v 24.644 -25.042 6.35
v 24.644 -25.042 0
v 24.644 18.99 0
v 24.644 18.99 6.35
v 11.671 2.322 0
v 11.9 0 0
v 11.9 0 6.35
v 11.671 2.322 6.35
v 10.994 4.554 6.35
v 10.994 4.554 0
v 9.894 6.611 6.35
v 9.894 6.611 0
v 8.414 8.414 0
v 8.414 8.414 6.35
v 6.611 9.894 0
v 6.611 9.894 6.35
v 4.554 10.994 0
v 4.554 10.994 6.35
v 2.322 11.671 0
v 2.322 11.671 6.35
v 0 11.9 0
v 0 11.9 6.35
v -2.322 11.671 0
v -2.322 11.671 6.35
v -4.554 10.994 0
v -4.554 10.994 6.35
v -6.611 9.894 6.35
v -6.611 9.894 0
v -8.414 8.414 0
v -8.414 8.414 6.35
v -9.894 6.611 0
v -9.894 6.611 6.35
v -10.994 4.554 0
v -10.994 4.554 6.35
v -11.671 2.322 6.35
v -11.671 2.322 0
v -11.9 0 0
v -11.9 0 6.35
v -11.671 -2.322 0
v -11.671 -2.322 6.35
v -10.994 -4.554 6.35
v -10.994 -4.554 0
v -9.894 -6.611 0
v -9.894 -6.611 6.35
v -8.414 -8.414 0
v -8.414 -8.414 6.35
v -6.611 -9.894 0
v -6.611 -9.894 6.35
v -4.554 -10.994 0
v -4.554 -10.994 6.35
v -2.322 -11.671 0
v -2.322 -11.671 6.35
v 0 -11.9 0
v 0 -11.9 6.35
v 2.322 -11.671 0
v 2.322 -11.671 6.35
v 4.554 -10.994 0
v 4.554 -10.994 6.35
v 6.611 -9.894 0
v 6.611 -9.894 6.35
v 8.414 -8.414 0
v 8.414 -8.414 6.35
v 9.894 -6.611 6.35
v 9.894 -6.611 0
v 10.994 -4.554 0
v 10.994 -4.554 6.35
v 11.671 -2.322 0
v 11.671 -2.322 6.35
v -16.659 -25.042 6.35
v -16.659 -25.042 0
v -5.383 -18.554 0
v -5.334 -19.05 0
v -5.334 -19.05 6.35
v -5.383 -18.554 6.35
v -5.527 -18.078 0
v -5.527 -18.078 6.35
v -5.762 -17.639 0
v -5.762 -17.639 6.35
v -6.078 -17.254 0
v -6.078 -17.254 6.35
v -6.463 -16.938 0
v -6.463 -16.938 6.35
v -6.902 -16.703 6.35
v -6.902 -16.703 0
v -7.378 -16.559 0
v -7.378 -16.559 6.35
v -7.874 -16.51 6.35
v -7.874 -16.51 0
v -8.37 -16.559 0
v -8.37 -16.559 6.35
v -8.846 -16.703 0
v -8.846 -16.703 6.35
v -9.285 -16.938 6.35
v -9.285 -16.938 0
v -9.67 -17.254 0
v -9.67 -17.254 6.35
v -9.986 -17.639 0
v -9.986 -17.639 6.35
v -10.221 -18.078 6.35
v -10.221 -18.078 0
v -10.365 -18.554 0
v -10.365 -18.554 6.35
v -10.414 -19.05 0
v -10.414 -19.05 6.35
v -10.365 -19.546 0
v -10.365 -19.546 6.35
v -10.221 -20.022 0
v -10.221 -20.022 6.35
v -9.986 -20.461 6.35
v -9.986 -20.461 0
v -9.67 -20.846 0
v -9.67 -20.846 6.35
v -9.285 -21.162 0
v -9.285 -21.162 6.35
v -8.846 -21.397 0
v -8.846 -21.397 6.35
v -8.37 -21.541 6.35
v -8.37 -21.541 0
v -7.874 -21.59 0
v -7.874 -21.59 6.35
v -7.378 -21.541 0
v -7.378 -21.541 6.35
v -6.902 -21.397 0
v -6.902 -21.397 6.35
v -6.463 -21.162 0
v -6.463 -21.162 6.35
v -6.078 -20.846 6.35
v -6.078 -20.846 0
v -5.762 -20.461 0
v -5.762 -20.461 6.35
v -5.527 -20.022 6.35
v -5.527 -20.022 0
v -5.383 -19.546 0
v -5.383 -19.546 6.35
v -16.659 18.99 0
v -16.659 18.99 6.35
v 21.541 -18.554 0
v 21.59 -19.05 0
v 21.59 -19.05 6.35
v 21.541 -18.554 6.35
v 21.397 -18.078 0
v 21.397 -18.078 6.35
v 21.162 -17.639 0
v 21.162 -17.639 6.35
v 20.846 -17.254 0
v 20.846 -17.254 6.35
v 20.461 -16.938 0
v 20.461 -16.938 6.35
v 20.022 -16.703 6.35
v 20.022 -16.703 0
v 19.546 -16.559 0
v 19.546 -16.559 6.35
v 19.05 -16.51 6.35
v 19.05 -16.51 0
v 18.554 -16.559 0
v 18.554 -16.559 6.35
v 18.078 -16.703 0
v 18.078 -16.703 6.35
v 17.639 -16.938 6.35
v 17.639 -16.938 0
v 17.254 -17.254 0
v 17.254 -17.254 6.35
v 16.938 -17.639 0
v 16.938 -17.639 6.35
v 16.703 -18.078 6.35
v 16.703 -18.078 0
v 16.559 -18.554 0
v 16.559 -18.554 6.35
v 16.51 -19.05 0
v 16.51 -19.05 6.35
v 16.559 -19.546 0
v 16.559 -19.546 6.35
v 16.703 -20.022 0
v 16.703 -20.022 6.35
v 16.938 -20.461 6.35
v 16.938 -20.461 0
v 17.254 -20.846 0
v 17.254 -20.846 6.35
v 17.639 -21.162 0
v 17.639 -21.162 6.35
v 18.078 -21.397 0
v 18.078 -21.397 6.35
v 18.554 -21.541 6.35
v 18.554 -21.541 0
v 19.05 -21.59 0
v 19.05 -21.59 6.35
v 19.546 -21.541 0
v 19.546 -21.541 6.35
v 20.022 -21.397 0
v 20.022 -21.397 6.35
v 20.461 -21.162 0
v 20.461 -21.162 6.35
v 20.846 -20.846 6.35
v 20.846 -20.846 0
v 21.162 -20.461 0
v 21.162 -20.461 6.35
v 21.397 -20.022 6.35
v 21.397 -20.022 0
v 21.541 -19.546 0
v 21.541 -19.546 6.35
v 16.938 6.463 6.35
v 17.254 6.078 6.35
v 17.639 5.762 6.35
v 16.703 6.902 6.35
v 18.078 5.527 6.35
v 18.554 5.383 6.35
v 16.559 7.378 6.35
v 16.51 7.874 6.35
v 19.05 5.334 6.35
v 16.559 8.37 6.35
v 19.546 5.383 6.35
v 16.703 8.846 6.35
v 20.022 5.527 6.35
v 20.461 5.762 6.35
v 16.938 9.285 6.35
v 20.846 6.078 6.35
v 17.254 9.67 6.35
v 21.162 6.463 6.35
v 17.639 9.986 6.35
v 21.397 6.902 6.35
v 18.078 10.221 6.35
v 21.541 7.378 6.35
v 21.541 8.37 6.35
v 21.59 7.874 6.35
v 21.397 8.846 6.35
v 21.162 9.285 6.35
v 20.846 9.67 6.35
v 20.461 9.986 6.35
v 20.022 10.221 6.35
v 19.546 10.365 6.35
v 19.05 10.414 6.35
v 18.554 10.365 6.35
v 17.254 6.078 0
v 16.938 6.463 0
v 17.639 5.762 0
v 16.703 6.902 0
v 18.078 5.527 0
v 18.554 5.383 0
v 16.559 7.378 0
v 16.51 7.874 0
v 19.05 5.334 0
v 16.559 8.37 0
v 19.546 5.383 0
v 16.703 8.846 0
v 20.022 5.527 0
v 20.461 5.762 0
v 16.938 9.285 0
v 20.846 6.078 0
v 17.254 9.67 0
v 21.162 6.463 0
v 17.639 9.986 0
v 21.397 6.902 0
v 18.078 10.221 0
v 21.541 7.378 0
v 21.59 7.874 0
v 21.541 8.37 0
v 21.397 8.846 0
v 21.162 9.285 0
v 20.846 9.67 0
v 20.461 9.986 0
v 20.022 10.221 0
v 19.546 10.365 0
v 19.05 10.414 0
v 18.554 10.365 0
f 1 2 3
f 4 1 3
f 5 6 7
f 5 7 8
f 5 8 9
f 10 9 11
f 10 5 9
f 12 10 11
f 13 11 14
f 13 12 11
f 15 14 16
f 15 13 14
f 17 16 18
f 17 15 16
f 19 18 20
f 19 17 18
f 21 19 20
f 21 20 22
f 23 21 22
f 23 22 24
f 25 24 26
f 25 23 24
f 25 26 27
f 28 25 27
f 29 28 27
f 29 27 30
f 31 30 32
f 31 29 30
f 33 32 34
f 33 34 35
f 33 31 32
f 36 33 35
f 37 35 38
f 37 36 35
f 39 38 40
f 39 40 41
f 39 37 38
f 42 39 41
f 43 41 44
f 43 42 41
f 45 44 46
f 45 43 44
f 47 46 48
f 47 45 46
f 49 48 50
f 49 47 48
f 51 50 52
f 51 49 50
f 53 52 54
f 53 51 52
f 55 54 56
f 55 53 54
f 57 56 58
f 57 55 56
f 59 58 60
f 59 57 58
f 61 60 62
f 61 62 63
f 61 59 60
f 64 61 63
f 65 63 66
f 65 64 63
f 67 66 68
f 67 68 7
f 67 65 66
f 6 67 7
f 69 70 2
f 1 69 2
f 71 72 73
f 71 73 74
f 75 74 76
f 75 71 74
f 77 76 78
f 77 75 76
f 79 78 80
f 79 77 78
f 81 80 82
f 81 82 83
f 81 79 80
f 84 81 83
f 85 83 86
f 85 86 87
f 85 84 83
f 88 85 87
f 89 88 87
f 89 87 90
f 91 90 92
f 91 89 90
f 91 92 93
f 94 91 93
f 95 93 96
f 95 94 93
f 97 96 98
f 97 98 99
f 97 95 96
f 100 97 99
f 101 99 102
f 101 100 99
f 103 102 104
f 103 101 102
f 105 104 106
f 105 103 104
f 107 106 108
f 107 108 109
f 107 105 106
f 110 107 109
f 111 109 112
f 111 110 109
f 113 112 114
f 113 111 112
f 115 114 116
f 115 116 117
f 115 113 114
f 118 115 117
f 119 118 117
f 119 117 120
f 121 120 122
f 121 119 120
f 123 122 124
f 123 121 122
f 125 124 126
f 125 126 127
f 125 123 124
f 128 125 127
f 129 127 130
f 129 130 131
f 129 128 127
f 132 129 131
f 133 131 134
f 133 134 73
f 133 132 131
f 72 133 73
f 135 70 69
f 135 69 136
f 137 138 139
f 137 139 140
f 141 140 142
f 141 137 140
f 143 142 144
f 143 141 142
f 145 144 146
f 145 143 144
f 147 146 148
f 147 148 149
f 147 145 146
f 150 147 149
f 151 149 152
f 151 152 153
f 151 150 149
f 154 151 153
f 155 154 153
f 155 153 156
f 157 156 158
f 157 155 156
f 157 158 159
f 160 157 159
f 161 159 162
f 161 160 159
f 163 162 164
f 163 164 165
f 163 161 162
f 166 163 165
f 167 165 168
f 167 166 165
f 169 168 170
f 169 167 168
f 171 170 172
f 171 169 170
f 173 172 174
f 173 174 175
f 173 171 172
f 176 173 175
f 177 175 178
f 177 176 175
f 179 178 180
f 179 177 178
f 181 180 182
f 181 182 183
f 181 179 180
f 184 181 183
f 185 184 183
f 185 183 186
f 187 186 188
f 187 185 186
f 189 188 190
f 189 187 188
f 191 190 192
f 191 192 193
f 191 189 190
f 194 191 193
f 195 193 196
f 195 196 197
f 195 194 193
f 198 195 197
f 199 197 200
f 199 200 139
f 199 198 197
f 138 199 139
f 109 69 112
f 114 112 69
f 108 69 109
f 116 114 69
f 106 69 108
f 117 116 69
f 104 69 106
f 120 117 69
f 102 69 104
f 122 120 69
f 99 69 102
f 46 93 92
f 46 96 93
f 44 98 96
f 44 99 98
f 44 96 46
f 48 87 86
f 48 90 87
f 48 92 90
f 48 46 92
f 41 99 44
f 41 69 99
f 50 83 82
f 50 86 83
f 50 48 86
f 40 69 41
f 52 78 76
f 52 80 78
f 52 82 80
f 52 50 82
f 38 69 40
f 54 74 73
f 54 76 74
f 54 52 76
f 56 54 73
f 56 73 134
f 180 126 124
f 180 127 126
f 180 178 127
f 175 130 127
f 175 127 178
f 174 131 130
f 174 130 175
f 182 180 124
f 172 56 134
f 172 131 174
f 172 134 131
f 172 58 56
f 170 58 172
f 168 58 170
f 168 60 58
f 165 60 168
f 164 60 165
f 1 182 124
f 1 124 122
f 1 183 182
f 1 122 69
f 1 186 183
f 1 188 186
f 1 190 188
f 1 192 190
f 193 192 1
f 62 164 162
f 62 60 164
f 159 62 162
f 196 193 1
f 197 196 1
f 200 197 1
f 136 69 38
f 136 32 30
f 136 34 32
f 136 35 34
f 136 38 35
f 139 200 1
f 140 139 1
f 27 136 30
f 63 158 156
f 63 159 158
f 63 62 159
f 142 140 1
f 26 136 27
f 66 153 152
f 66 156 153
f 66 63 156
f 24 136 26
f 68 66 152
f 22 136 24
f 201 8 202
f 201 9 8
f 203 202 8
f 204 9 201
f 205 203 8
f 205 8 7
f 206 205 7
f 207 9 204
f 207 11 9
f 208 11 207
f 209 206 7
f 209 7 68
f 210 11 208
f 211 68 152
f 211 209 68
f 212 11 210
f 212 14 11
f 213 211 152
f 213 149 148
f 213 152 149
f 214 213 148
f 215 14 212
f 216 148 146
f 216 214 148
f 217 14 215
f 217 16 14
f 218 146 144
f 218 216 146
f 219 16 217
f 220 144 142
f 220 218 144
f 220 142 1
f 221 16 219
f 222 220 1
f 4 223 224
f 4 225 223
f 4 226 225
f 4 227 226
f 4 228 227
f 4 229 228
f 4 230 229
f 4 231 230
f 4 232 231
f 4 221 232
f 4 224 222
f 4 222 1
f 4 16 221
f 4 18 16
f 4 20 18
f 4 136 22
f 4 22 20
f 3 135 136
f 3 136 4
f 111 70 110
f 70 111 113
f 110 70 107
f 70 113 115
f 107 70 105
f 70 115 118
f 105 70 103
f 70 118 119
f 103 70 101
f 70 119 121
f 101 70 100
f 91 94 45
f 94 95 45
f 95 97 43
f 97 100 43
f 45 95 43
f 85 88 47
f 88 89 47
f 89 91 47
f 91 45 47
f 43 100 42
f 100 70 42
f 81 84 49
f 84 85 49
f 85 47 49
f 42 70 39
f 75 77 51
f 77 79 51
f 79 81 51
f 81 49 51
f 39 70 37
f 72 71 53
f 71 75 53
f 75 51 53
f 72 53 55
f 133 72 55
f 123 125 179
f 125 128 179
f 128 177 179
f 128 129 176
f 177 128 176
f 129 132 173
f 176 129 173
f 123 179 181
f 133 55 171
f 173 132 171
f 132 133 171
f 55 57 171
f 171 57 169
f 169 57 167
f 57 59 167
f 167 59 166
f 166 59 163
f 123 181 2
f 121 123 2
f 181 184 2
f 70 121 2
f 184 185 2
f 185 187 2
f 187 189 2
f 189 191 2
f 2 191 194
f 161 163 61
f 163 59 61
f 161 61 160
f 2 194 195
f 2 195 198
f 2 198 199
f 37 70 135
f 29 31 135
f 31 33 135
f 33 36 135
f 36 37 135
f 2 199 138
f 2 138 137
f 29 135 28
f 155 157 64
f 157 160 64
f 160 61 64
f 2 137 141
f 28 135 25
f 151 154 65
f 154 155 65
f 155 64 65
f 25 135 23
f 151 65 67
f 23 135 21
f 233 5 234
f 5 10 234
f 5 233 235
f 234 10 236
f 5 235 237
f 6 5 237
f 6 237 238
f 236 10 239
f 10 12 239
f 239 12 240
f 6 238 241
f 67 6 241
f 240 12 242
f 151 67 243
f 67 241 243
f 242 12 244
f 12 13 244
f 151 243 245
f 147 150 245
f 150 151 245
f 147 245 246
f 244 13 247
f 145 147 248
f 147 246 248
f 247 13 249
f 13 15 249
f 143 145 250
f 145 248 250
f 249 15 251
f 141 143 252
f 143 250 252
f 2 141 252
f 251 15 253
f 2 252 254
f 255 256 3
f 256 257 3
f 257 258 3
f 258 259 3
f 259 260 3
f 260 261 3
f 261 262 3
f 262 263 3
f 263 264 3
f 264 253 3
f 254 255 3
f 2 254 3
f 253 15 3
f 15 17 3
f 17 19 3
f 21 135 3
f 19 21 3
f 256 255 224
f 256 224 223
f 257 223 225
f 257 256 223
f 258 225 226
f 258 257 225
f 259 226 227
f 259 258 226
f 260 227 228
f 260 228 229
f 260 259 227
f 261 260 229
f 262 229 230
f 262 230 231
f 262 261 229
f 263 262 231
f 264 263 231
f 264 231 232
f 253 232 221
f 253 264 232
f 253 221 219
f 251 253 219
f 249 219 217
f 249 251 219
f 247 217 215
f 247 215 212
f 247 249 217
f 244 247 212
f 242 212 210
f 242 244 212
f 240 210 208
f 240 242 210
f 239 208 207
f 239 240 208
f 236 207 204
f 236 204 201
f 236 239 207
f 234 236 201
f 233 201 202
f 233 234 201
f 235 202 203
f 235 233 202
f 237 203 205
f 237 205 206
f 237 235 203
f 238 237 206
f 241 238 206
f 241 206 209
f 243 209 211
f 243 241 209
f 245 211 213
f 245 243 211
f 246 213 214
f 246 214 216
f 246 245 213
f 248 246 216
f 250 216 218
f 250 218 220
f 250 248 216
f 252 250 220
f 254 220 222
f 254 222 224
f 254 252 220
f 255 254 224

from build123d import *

# Parameters (mm, degrees)
SKETCH1_W           = 41.303343927
SKETCH1_H           = 44.031810838
SKETCH1_R           = 11.8999
SKETCH1_R_2         = 2.54
BOSS_EXTRUDE1_DEPTH = 6.35


with BuildPart() as part:
    # Sketch1 → Boss-Extrude1 (new body)
    with BuildSketch(Plane.XY):
        with Locations((3.992518762, -3.025665718)):
            Rectangle(SKETCH1_W, SKETCH1_H)
        Circle(SKETCH1_R, mode=Mode.SUBTRACT)
        with Locations((19.05, 7.874)):
            Circle(SKETCH1_R_2, mode=Mode.SUBTRACT)
        with Locations((19.05, -19.05)):
            Circle(SKETCH1_R_2, mode=Mode.SUBTRACT)
        with Locations((-7.874, -19.05)):
            Circle(SKETCH1_R_2, mode=Mode.SUBTRACT)
    extrude(amount=BOSS_EXTRUDE1_DEPTH)


solid = part.part
